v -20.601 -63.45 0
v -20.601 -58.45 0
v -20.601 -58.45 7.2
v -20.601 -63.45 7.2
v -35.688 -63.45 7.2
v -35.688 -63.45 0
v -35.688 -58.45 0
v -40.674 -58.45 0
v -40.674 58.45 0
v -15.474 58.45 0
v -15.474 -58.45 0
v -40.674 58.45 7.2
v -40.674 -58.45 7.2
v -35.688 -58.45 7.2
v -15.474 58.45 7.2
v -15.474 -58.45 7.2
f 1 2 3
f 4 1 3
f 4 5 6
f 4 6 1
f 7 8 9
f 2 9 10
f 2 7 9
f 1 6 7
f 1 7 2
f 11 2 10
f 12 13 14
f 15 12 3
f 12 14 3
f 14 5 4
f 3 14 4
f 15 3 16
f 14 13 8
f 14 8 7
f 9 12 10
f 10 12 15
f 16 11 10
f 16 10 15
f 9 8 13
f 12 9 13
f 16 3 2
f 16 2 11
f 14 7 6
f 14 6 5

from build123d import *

# Parameters (mm, degrees)
F0_W     = 25.2
F0_H     = 7.2
F1_DEPTH = 58.45
F2_W     = 15.086318
F2_H     = 7.2
F3_DEPTH = 5


with BuildPart() as f1:
    # F0 (on Front) → F1 (new body, symmetric)
    with BuildSketch(Plane.XZ):
        with Locations((-28.073686, 3.6)):
            Rectangle(F0_W, F0_H)
    extrude(amount=F1_DEPTH, both=True)

    # F2 (on face) → F3 (join)
    with BuildSketch(Plane.XZ.offset(58.45)):
        with Locations((-28.144586, 3.6)):
            Rectangle(F2_W, F2_H)
    extrude(amount=F3_DEPTH)


solid = f1.part
